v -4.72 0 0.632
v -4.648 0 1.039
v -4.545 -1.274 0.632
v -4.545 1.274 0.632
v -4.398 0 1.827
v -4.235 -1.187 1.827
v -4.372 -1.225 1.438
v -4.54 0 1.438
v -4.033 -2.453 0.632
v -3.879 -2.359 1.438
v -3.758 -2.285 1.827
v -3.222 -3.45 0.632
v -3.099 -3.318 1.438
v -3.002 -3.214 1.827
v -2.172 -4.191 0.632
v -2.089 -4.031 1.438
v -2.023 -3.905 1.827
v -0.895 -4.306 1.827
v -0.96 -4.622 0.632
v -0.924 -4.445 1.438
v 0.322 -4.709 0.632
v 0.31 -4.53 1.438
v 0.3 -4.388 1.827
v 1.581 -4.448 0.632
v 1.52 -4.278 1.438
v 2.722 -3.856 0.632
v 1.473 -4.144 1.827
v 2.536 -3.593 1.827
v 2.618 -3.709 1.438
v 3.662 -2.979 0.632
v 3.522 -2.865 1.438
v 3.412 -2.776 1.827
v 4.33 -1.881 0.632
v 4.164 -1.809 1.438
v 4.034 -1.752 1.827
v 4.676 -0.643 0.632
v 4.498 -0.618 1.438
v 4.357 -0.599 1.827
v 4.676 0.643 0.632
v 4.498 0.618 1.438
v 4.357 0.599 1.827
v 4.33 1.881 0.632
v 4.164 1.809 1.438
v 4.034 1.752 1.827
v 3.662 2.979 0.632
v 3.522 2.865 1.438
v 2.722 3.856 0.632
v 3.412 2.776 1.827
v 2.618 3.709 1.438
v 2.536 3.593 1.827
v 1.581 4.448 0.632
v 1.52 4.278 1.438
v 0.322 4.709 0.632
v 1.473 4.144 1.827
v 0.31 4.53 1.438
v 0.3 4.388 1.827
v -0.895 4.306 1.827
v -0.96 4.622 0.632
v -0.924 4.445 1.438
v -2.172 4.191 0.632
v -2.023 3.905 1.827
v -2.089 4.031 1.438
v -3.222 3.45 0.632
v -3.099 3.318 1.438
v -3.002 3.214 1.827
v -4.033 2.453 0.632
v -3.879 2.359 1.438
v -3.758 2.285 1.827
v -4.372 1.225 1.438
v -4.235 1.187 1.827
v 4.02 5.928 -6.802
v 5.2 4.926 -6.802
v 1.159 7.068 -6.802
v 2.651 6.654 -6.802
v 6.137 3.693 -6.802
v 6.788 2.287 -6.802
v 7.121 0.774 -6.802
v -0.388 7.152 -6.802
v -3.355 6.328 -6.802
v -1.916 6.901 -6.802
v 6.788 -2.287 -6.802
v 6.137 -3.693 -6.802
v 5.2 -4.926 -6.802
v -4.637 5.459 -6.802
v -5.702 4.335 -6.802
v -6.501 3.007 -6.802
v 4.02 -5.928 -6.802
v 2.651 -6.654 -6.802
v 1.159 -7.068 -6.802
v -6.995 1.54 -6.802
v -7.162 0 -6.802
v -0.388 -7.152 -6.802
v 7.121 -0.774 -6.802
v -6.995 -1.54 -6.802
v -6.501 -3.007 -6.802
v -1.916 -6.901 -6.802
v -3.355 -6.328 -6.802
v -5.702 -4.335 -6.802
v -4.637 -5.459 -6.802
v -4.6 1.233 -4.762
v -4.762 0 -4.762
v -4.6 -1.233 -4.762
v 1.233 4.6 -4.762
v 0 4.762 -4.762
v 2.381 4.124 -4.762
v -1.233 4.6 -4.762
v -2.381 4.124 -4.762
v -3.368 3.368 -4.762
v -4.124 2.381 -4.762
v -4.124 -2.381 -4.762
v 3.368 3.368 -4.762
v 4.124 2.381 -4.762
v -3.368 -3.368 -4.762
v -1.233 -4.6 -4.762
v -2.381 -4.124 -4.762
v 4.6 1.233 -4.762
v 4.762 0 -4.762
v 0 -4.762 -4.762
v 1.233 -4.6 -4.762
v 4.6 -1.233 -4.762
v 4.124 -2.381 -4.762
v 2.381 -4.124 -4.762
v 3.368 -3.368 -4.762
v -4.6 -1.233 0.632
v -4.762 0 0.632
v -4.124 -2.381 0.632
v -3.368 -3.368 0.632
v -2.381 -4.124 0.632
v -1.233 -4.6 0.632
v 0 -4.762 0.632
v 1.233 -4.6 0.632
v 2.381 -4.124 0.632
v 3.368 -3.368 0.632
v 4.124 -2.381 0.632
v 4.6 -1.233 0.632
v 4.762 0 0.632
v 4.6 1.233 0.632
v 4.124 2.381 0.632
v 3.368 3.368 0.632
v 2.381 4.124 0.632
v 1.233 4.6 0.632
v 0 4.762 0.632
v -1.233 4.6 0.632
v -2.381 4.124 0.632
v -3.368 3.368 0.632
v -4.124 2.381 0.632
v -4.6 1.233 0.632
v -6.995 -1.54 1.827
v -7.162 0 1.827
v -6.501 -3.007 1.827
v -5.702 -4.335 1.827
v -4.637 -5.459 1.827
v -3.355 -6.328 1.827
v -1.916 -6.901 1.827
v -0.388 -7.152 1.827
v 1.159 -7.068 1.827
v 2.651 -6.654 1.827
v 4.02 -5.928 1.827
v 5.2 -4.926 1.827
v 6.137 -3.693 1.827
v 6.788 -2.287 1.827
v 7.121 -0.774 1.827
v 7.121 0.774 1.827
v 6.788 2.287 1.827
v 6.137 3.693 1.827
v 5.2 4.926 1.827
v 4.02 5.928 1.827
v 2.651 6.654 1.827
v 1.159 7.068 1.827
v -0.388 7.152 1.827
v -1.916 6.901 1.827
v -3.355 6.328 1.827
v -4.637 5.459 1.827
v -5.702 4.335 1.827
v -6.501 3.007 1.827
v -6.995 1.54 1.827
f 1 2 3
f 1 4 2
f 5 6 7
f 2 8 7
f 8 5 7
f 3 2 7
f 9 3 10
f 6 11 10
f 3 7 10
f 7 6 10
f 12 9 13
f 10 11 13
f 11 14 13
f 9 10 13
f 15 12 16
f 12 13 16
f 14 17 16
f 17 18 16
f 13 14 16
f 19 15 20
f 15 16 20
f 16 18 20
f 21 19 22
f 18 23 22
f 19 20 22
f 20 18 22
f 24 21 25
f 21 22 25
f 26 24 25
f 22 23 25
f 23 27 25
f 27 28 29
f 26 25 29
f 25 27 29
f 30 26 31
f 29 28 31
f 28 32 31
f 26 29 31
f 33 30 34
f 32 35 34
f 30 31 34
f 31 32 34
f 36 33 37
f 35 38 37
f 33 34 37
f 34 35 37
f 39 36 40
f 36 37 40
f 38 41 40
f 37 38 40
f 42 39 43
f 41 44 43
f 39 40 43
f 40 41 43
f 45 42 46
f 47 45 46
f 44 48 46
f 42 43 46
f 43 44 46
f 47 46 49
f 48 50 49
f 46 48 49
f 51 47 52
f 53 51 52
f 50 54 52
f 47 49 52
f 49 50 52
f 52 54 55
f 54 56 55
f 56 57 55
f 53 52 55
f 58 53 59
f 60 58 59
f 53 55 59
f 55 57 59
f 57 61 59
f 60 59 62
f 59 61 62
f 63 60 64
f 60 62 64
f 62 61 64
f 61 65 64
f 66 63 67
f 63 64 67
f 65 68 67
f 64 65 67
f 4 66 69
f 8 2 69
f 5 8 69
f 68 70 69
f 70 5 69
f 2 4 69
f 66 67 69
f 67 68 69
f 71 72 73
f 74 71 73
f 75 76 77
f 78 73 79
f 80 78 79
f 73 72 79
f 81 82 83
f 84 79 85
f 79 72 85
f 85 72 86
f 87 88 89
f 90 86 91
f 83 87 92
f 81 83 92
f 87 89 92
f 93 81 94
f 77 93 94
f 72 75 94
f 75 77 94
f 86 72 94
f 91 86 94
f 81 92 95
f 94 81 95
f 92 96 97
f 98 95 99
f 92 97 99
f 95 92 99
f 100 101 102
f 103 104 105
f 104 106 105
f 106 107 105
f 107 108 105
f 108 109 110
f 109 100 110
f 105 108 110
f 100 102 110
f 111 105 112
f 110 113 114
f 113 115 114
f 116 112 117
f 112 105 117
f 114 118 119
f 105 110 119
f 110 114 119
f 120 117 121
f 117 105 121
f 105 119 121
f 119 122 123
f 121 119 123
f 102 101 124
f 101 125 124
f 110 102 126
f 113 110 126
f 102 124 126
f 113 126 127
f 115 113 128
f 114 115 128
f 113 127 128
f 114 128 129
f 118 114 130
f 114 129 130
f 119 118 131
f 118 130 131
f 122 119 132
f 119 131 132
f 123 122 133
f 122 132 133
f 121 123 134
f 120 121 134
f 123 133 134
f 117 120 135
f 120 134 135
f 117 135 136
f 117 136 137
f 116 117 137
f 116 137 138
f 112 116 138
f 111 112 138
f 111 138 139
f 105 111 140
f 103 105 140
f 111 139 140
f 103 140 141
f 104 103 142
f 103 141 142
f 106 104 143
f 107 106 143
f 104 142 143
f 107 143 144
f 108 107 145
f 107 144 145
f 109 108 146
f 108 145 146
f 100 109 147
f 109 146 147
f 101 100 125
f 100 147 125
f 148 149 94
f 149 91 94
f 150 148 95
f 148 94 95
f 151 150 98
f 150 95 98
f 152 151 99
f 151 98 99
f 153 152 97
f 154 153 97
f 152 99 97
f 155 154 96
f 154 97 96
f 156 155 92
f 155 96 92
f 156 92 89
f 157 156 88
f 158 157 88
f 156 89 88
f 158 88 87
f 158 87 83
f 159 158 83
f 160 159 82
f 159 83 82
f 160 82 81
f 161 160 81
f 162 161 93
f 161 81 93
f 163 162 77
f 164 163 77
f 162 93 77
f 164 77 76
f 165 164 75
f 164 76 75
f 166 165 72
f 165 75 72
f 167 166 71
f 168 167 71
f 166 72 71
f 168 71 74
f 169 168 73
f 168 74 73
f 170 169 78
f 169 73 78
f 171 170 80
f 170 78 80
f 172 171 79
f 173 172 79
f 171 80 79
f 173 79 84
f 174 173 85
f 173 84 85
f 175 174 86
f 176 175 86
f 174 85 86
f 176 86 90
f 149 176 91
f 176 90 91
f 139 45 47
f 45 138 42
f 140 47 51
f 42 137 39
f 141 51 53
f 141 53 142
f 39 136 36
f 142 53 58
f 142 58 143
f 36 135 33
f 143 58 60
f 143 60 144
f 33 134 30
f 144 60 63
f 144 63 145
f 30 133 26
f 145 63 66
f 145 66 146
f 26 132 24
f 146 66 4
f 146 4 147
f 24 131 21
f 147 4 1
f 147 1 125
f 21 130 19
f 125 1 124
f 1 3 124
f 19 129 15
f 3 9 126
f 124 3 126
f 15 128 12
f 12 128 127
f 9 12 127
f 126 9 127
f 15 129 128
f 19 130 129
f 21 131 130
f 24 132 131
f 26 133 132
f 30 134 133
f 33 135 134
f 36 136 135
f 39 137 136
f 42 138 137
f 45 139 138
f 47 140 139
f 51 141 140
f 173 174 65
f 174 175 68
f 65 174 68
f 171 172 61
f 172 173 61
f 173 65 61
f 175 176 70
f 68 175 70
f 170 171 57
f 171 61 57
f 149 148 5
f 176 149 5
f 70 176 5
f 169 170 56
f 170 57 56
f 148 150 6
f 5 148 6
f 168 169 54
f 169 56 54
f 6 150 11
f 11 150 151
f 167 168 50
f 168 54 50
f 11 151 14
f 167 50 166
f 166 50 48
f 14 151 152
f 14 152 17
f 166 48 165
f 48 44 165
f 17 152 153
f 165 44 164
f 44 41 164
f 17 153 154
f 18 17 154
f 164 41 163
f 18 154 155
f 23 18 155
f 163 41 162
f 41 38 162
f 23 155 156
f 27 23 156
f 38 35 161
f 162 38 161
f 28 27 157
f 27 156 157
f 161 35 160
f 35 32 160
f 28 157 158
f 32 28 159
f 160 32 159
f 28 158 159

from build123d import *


with BuildPart() as f1:
    # F0 (on Front) → F1 (revolve)
    with BuildSketch(Plane.XZ):
        Polygon((-4.7625, 0.631558), (-4.7625, 1.826994), (-7.1625, 1.826994), (-7.1625, -6.801847), (0, -6.801847), (0, -4.7625), (-4.7625, -4.7625), align=None)
        with BuildLine():
            Line((-4.398125, 1.826994), (-4.7625, 1.826994))
            Line((-4.7625, 1.826994), (-4.7625, 0.631558))
            Line((-4.7625, 0.631558), (-4.720439, 0.631558))
            ThreePointArc((-4.720439, 0.631558), (-4.598295, 1.239794), (-4.398125, 1.826994))
        make_face()
    revolve(axis=Axis((0, 0, -5.782173), (0, 0, 1)))


solid = f1.part
